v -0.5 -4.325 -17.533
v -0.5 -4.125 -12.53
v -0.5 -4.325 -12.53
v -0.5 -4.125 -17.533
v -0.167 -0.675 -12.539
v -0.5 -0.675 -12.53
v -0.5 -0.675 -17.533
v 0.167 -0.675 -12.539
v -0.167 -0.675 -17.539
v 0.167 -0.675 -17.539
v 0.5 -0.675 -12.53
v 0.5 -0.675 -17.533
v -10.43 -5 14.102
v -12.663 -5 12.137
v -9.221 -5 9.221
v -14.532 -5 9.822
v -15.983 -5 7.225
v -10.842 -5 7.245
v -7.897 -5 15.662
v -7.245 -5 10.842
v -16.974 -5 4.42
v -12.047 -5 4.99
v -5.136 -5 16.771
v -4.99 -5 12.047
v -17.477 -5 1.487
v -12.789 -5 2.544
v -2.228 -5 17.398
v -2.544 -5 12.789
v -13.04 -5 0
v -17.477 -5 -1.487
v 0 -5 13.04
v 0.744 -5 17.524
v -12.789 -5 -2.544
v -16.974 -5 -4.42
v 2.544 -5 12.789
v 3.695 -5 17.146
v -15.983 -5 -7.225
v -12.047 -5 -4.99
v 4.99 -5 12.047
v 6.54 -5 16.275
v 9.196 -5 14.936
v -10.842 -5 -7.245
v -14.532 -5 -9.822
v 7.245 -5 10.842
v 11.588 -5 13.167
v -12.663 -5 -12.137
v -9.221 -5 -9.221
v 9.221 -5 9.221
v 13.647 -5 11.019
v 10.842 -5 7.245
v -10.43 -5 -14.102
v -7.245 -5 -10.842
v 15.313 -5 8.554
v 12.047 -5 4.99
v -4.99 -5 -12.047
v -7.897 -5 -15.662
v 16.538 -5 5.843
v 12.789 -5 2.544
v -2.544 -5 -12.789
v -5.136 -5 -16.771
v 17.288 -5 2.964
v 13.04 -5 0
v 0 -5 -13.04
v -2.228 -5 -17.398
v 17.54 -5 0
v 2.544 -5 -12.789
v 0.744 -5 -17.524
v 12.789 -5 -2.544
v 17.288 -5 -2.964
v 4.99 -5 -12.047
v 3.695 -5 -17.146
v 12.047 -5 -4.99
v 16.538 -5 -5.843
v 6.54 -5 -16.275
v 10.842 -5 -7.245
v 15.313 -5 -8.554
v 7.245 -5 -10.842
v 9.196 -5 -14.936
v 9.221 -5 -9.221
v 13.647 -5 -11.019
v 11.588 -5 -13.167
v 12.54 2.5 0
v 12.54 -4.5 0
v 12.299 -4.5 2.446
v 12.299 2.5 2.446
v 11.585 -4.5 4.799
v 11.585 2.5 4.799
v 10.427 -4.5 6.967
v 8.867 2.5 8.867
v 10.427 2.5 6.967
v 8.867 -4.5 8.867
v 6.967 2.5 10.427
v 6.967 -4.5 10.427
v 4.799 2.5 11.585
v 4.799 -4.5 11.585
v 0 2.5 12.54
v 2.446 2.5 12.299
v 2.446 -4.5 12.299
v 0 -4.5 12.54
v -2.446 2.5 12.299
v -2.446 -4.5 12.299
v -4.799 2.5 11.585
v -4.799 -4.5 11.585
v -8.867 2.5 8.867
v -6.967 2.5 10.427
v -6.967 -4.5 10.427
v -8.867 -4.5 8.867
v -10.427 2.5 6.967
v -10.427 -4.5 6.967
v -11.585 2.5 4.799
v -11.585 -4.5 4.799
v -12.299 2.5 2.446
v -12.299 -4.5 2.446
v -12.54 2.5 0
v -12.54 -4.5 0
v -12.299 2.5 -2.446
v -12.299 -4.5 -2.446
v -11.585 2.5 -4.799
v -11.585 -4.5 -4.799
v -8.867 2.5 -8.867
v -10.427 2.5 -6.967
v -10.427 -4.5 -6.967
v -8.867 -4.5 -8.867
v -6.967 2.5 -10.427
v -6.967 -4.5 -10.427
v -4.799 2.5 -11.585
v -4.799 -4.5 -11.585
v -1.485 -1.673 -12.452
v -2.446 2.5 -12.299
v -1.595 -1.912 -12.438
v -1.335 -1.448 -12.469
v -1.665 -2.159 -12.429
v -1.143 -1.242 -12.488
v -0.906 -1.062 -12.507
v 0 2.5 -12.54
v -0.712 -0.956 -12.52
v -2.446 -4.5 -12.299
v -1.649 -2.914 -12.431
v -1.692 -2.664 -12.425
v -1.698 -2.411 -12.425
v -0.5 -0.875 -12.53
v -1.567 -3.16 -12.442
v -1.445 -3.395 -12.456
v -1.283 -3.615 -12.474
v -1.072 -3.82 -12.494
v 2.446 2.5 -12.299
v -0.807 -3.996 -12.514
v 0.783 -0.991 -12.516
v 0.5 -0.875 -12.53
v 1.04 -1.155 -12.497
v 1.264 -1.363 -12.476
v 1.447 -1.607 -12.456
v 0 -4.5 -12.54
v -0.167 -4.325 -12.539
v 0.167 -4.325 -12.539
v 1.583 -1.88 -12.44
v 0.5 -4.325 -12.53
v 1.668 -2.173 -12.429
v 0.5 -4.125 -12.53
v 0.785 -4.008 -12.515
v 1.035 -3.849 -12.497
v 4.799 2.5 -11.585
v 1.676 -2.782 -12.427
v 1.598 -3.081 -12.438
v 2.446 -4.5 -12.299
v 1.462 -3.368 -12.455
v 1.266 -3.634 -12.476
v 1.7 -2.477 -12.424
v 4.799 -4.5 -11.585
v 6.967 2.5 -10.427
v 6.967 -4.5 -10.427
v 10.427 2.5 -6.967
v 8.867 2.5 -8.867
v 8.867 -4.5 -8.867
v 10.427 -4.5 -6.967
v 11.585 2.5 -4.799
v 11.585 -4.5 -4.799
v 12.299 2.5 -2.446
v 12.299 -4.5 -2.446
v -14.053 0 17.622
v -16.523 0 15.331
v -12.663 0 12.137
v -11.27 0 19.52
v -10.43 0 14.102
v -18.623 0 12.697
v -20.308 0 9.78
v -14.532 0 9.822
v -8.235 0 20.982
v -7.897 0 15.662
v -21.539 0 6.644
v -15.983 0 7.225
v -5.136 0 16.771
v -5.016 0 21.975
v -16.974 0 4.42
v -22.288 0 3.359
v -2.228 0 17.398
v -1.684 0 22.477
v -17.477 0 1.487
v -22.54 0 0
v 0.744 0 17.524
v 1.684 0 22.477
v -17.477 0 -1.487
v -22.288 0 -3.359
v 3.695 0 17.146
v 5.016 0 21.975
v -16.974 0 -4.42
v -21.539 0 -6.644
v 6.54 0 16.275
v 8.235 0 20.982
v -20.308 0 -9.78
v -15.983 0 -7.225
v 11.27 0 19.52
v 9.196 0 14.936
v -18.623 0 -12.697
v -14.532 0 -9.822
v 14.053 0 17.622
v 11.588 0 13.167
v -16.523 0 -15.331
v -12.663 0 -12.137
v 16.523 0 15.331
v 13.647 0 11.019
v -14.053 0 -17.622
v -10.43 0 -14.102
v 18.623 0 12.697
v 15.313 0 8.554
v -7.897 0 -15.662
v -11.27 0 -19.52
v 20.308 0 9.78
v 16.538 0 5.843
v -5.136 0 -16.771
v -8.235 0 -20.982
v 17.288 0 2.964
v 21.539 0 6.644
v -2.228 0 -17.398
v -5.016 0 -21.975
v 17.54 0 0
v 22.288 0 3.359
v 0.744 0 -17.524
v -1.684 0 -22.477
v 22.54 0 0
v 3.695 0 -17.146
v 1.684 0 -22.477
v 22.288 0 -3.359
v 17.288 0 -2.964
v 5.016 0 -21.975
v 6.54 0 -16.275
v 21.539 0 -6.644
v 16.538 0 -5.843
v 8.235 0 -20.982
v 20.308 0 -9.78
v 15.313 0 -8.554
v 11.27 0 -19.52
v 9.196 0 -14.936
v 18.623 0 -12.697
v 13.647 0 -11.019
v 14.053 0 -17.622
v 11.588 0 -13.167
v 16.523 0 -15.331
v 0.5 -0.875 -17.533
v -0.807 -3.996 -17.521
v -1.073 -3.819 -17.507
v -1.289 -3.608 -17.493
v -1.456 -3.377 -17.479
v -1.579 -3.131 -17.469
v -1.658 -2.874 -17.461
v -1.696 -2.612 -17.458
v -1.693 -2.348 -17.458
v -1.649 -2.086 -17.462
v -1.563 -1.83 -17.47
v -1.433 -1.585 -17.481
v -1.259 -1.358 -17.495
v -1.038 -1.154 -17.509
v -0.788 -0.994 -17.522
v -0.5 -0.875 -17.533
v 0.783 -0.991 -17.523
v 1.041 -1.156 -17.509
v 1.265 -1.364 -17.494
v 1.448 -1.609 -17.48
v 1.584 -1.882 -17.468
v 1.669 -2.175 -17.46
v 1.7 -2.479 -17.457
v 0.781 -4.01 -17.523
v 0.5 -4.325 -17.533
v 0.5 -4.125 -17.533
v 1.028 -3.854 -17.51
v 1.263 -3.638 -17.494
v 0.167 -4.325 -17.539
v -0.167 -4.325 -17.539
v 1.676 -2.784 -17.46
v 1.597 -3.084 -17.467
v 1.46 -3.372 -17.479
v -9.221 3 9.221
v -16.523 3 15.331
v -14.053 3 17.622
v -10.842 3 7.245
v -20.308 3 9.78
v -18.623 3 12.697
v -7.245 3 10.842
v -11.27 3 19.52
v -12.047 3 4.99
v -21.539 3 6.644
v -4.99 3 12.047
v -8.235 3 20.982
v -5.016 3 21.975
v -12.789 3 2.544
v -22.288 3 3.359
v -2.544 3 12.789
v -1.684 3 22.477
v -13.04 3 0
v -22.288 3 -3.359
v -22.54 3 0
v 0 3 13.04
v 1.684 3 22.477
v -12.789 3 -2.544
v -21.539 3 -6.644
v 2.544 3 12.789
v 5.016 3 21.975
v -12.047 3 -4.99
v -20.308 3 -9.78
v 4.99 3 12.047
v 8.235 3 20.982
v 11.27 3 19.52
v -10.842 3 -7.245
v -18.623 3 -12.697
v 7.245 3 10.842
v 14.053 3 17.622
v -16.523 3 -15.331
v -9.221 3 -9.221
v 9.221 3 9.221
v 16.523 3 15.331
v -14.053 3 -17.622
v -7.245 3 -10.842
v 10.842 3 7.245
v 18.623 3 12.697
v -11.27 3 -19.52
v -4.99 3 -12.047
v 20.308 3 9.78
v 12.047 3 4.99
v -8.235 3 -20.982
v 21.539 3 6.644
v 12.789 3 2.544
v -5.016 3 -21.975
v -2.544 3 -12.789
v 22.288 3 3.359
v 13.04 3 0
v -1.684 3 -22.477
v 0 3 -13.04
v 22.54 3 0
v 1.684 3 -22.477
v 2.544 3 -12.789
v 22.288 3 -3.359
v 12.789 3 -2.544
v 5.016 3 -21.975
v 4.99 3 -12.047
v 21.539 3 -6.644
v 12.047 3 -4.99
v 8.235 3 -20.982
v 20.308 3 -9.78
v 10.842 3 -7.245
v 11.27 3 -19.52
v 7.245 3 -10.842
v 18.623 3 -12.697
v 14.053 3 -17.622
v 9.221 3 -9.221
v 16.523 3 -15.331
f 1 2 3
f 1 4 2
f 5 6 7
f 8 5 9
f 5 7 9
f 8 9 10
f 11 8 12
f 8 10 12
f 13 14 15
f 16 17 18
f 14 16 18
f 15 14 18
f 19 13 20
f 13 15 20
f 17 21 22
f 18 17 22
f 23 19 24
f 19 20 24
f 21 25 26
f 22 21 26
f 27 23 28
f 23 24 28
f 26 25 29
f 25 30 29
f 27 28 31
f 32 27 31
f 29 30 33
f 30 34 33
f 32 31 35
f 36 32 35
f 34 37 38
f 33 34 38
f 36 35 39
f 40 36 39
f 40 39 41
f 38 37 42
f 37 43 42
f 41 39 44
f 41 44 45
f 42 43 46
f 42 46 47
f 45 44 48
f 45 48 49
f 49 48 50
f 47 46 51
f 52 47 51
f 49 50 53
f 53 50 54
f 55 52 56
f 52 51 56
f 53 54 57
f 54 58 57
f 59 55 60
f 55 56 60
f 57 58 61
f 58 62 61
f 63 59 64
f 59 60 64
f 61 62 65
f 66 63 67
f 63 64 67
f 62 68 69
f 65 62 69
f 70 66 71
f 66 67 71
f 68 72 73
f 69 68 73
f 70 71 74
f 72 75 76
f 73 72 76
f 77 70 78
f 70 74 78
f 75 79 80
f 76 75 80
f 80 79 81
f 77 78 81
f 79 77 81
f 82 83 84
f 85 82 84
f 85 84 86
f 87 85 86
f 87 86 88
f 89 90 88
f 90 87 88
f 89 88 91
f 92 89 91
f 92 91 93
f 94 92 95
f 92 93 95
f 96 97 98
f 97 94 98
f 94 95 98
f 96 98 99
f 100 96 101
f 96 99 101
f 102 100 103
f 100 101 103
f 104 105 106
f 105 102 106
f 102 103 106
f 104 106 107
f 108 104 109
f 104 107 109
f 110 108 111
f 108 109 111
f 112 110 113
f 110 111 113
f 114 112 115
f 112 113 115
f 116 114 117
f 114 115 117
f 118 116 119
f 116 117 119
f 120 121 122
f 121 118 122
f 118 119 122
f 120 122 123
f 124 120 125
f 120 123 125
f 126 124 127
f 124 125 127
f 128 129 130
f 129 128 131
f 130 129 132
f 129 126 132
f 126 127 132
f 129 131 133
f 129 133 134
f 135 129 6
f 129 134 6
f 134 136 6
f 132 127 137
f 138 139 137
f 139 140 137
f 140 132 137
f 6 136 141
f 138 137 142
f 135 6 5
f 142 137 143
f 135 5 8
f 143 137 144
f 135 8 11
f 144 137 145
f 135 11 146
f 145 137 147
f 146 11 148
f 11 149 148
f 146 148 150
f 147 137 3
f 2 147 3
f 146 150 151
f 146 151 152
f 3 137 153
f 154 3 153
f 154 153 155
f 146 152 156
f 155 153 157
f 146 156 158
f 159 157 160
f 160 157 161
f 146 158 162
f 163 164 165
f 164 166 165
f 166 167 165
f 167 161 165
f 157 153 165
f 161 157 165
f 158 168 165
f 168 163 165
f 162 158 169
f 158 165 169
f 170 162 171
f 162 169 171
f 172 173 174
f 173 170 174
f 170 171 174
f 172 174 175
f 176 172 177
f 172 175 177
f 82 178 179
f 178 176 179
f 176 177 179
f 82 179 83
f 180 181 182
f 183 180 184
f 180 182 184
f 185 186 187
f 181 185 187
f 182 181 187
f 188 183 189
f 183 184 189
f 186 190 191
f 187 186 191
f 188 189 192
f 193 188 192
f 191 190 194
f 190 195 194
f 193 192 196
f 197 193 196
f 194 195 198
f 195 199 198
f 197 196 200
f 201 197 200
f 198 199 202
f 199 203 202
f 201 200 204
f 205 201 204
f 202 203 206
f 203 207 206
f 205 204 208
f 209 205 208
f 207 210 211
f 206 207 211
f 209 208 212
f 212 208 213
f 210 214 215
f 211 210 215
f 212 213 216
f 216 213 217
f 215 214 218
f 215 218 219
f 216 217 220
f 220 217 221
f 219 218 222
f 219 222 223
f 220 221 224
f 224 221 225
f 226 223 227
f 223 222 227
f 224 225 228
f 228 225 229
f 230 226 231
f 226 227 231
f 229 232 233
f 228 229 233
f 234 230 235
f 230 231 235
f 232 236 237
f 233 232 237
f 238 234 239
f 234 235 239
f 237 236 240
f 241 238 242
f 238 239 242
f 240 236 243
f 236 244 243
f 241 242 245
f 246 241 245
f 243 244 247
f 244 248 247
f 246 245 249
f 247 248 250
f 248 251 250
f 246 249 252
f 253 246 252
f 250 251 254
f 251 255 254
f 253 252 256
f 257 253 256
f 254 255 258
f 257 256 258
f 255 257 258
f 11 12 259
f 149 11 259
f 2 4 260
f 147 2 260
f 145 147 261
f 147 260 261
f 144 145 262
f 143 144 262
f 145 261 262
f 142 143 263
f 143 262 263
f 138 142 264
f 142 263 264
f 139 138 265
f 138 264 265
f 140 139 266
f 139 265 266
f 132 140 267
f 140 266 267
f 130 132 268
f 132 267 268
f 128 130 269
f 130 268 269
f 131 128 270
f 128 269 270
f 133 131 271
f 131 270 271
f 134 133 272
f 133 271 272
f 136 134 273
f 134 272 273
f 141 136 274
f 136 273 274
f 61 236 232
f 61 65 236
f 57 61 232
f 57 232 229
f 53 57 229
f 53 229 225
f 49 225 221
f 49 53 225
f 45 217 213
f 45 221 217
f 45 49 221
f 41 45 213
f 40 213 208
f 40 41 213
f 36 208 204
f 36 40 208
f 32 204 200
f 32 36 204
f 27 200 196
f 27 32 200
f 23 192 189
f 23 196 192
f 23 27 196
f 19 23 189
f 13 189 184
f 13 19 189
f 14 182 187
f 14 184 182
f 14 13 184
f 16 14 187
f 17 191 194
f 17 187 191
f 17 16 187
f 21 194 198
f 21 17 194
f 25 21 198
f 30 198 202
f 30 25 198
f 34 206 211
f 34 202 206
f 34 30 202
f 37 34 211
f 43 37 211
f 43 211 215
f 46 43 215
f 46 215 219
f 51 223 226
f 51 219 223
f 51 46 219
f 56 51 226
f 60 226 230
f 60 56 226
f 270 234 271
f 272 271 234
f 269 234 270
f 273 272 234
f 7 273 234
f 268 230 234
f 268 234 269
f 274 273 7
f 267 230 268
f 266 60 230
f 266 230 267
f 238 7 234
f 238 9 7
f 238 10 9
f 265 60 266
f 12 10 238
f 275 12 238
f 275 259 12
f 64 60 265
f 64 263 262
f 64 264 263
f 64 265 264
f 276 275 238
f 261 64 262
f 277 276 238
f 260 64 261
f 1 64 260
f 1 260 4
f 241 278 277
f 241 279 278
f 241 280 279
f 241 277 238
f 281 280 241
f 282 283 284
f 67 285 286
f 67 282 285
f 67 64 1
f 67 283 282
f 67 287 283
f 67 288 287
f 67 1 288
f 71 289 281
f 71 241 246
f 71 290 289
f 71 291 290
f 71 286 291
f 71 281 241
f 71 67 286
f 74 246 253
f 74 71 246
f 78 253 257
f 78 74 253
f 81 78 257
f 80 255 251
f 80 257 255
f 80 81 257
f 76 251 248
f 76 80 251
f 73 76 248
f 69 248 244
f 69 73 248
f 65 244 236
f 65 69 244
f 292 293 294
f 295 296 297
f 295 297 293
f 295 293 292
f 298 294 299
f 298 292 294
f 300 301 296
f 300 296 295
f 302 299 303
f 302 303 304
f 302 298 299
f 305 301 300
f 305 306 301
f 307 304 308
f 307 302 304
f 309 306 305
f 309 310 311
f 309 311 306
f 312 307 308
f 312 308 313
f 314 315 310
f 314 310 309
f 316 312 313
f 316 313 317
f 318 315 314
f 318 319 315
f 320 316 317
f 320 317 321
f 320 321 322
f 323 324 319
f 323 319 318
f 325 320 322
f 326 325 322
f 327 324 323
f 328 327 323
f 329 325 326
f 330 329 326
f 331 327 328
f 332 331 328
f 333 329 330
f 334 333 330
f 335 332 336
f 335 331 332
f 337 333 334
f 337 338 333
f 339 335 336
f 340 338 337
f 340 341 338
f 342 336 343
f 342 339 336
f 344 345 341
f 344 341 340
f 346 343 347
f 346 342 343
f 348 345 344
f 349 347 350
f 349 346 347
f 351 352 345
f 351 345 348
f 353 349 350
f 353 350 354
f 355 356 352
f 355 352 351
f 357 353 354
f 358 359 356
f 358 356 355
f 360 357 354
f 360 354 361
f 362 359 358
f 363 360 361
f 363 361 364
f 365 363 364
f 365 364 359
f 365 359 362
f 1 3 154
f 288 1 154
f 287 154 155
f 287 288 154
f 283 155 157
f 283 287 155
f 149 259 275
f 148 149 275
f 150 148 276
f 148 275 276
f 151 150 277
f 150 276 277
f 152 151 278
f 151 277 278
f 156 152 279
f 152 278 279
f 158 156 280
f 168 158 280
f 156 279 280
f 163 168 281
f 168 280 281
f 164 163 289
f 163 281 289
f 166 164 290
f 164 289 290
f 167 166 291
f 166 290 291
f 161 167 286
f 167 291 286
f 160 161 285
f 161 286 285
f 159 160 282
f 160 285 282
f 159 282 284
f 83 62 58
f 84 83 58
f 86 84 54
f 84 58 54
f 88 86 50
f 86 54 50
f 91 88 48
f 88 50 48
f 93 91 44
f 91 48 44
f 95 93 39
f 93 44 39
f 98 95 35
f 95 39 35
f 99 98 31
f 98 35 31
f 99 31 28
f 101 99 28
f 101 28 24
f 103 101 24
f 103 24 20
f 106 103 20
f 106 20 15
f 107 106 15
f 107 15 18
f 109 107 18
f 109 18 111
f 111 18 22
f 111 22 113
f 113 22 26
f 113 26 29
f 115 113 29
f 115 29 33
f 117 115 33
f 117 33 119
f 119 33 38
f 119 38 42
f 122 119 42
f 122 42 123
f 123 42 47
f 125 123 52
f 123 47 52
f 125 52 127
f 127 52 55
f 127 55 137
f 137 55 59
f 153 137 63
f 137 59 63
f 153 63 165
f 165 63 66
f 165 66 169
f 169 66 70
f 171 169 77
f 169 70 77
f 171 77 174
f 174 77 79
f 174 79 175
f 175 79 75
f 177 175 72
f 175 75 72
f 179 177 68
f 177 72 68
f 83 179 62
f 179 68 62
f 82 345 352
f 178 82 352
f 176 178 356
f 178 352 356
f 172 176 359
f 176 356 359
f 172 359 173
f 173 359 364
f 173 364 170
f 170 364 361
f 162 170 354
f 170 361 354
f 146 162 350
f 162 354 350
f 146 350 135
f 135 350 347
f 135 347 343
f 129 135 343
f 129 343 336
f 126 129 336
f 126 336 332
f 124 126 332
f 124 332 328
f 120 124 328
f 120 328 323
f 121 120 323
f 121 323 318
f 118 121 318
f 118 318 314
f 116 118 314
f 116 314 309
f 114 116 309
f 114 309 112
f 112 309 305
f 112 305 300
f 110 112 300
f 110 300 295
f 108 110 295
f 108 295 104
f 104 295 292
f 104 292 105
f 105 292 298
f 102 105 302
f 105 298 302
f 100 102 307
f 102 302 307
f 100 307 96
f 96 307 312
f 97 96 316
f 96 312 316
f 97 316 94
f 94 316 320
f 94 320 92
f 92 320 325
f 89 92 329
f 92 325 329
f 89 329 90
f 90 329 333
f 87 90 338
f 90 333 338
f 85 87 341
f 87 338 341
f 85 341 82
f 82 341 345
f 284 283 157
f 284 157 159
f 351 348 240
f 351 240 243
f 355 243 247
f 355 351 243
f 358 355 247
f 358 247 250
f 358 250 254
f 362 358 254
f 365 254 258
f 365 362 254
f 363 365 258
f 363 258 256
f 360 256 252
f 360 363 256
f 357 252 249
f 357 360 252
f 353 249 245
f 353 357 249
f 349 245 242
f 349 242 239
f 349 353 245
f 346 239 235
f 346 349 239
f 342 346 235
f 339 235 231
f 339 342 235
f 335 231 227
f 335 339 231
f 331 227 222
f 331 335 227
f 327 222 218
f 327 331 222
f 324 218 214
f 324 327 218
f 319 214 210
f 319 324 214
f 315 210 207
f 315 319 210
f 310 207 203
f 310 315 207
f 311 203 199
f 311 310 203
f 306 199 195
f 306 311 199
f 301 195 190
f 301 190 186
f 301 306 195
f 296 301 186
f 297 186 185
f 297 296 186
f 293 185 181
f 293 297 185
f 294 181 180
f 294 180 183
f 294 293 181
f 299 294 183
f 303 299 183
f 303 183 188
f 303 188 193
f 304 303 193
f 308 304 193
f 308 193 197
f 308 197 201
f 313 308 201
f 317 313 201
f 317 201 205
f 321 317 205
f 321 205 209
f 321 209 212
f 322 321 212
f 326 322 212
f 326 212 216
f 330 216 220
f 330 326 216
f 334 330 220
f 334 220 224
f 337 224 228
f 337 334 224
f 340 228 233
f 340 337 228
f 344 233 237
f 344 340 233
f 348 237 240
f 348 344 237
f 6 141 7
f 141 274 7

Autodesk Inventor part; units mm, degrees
ref_plane "YZ Plane" through (0, 0, 0) normal (1, 0, 0) x (0, 1, 0)
ref_plane "XZ Plane" through (0, 0, 0) normal (0, 1, 0) x (-1, 0, 0)
sketch "Sketch1" plane through (0, 0, 0) normal (0, 0, 1) x (1, 0, 0)
  line L0 (12.54, 0) -> (22.54, 0)
  line L1 (22.54, 0) -> (22.54, 3)
  line L2 (22.54, 3) -> (12.54, 3)
  line L3 (12.54, 3) -> (12.54, 0)
  line L4 (12.54, 0) -> (17.54, 0)
  line L5 (17.54, 0) -> (17.54, -5)
  line L6 (17.54, -5) -> (12.54, -5)
  line L7 (12.54, -5) -> (12.54, 0)
  line L8 (0, -6.6) -> (0, 4.6) projected
  point P0 (0, 0)
  point P1 (17.54, 0)
  dimension "d0" = 3
  dimension "d1" = 12.54
  dimension "d2" = 10
  dimension "d3" = 5
  dimension "d4" = 5
revolve "Revolution1" add sketch "Sketch1" angle 360 about axis through (0, -10, 0) along (0, 1, 0)
sketch "Sketch2" plane through (0, 0, 0) normal (0, 0, 1) x (1, 0, 0)
  line L0 (12.54, -5) -> (-12.54, -5) projected
  line L1 (12.54, 3) -> (-12.54, 3) projected
  line L2 (0, 0) -> (0, -5) construction
  point P0 (0, -2.5)
hole "Hole1" at (0, -2.5, 0) direction (0, 0, -1) diameter 3.4 end through all clearance for "Hex Head Cap Screw ISO 24017" size "M3" standard "ISO"
chamfer "Chamfer1" distance 0.5 angle 45 2 edges at (-12.54, -5, 0) (-12.54, 3, 0)
ref_plane "Work Plane1" through (0, 0, -17.54) normal (0, 0, 1) x (1, 0, 0)
sketch "Sketch3" plane through (0, 0, -17.54) normal (0, 0, 1) x (1, 0, 0)
  line L0 (-0.5, -0.8752) -> (0.5, -0.8752)
  line L1 (0.5, -0.8752) -> (0.5, -4.1248)
  line L2 (0.5, -4.1248) -> (-0.5, -4.1248)
  line L3 (-0.5, -4.1248) -> (-0.5, -0.8752)
  line L4 (-0.5, -0.8752) -> (0.5, -4.1248) construction
  line L5 (0.5, -0.8752) -> (-0.5, -4.1248) construction
  line L6 (0.5, -4.1248) -> (-0.5, -4.1248)
  line L7 (-0.5, -4.1248) -> (-0.5, -4.3248)
  line L8 (-0.5, -4.3248) -> (0.5, -4.3248)
  line L9 (0.5, -4.3248) -> (0.5, -4.1248)
  line L10 (0.5, -0.8752) -> (-0.5, -0.8752)
  line L11 (-0.5, -0.8752) -> (-0.5, -0.6752)
  line L12 (-0.5, -0.6752) -> (0.5, -0.6752)
  line L13 (0.5, -0.6752) -> (0.5, -0.8752)
  point P0 (0, 0)
  point P1 (1.7, -2.5)
  point P2 (1.7, -2.5)
  point P3 (1.7, -2.5)
  point P4 (0, -2.5)
  dimension "d22" = 1
  dimension "d24" = 0.2
  dimension "d25" = 0.2
extrude "Extrusion1" cut sketch "Sketch3" along normal blind 20 contours L11 L12 L13 L0 | L2 L9 L8 L7
properties part number "spring safety  for print"
